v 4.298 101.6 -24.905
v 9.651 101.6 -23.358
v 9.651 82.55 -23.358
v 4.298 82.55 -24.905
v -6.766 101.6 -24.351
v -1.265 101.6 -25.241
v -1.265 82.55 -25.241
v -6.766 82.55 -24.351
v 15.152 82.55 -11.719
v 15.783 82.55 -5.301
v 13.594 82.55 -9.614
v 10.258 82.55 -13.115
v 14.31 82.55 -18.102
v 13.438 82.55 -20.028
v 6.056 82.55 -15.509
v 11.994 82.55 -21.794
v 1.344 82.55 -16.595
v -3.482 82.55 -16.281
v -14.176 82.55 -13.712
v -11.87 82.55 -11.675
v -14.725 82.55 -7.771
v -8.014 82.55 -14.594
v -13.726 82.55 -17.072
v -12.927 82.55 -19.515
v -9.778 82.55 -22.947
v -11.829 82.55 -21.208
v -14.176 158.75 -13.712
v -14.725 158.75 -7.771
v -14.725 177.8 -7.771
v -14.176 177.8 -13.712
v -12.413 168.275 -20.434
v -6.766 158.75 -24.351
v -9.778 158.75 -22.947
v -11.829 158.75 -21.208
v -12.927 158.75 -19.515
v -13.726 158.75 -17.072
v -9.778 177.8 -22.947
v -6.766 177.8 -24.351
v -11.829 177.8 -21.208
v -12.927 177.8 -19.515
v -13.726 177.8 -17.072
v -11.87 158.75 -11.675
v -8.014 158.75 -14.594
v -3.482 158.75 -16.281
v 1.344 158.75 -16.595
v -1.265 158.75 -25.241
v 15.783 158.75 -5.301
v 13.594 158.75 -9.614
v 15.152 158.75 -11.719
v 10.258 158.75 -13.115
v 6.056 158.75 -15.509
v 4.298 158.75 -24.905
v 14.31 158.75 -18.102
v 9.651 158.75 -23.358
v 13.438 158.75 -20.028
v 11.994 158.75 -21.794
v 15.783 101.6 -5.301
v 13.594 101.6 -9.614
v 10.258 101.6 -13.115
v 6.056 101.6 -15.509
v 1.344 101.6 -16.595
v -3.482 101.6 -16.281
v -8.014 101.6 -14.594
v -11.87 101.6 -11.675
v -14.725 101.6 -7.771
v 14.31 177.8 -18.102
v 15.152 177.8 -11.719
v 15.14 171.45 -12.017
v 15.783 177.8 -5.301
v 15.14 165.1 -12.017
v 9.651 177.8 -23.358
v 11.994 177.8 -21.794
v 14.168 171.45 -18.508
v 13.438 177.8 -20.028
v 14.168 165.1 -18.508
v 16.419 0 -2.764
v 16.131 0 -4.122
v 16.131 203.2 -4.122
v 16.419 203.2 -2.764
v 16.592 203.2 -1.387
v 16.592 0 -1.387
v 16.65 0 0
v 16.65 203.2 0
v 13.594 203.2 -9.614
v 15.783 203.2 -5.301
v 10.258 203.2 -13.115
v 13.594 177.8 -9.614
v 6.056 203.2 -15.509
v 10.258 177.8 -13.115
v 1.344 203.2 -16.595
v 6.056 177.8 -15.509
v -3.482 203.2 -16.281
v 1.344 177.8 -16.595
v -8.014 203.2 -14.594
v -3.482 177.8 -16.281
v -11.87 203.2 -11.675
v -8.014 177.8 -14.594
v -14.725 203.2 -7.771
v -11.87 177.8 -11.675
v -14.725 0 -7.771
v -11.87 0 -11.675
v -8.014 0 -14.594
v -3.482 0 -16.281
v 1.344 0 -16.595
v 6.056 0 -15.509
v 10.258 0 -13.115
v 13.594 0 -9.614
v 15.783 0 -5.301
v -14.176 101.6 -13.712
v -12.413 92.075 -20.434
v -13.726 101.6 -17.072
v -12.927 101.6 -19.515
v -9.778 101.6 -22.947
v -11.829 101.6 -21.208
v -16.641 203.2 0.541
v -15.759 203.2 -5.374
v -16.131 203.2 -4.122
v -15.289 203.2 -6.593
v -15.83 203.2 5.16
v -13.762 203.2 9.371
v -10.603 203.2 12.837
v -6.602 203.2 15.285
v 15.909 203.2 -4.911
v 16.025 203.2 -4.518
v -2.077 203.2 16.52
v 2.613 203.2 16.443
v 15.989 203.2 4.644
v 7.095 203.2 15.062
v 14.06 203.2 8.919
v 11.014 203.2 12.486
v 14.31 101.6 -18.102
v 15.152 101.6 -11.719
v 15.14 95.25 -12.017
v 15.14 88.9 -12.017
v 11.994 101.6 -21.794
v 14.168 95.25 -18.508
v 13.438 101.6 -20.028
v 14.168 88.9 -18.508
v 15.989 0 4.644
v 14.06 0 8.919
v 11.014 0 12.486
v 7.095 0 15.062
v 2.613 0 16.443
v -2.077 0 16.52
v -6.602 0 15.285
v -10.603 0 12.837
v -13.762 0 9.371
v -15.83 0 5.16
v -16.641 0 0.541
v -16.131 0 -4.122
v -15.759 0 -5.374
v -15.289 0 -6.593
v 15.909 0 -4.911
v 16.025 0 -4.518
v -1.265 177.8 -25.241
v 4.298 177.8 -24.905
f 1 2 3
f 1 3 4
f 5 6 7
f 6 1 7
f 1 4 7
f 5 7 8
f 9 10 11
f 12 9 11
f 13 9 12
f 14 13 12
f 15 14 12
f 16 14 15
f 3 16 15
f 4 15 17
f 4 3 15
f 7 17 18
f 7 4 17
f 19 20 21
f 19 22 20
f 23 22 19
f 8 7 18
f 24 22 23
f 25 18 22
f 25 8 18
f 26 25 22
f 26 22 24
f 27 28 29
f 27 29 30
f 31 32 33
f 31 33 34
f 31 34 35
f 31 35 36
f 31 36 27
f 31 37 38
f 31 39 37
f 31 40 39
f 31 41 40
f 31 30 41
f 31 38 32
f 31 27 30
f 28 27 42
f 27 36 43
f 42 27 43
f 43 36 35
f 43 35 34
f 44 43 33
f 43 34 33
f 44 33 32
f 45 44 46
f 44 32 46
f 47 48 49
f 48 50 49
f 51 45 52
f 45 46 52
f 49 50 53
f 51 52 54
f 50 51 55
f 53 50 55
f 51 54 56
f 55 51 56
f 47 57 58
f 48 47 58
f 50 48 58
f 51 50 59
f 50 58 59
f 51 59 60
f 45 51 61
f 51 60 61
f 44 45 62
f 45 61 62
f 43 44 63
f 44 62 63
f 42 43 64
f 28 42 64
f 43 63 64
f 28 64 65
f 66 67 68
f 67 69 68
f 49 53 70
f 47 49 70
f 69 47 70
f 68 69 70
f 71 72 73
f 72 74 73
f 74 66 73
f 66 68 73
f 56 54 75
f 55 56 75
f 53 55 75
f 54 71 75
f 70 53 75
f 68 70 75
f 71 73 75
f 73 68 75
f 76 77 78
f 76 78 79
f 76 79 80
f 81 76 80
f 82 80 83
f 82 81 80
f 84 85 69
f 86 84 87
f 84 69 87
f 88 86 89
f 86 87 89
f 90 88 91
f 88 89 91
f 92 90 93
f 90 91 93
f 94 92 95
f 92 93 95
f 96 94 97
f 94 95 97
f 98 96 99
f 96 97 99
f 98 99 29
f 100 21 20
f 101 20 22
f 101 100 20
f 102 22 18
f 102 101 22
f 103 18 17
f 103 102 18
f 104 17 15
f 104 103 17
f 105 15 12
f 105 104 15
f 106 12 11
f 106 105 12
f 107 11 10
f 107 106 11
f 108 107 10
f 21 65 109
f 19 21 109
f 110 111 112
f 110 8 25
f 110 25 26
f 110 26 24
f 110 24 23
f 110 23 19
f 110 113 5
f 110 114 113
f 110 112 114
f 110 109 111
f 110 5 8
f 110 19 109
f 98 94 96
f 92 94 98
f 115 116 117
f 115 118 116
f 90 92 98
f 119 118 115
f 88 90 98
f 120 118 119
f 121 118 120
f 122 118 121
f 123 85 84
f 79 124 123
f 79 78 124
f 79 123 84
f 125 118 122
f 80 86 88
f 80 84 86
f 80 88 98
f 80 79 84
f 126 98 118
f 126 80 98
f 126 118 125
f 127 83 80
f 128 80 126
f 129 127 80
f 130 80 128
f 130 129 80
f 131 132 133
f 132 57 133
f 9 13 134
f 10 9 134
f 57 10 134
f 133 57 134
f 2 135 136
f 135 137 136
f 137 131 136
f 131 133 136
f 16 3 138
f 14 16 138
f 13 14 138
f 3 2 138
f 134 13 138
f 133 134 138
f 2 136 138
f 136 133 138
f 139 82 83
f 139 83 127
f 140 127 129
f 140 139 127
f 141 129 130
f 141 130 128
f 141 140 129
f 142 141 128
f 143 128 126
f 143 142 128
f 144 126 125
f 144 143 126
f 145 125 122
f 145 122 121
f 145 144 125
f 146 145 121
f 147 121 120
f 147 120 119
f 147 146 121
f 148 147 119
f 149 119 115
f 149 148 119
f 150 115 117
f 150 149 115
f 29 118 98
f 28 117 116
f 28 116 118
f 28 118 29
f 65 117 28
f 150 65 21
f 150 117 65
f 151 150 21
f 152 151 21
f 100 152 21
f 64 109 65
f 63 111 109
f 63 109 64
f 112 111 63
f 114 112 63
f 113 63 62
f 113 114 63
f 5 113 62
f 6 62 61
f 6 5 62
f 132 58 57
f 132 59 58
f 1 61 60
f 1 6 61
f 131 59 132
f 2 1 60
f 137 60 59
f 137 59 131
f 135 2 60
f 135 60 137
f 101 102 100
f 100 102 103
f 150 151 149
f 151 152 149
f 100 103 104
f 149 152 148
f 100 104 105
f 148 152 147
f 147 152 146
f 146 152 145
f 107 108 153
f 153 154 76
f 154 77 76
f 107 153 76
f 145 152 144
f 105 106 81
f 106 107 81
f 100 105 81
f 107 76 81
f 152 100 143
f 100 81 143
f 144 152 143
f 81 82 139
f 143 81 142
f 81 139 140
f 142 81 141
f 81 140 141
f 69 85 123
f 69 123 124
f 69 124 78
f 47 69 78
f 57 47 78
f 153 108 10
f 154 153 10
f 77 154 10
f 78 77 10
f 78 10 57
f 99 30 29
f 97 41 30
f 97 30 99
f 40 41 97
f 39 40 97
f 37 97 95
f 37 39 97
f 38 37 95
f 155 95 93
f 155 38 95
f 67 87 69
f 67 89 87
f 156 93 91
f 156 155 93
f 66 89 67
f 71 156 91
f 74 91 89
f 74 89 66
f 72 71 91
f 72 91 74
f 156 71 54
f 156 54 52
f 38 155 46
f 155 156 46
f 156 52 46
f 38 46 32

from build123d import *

# Parameters (mm, degrees)
SKETCH1_R           = 25.273
BOSS_EXTRUDE1_DEPTH = 203.2
CUT_EXTRUDE1_START  = -203.2
CUT_EXTRUDE1_DEPTH  = 203.2
SKETCH3_OUTSIDE_W   = 77.326
SKETCH3_OUTSIDE_H   = 85.949
SKETCH3_OUTSIDE_R   = 16.6497
CUT_EXTRUDE5_DEPTH  = 50.8
SKETCH4_OUTSIDE_W   = 77.326
SKETCH4_OUTSIDE_H   = 85.949
SKETCH4_OUTSIDE_R   = 16.6497
CUT_EXTRUDE6_DEPTH  = 57.15
SKETCH5_OUTSIDE_W   = 77.326
SKETCH5_OUTSIDE_H   = 85.949
SKETCH5_OUTSIDE_R   = 16.6497
CUT_EXTRUDE7_DEPTH  = 82.55


with BuildPart() as part:
    # Sketch1 → Boss-Extrude1 (new body)
    with BuildSketch(Plane(origin=(0, 0, 0), x_dir=(1, 0, 0), z_dir=(0, 1, 0))):
        with Locations(Location((0, 0, 0), (0, 0, 270))):
            Circle(SKETCH1_R)
    extrude(amount=BOSS_EXTRUDE1_DEPTH)

    # Sketch2 → Cut-Extrude1 (cut)
    with BuildSketch(Plane(origin=(0, 203.2, 0), x_dir=(1, 0, 0), z_dir=(0, 1, 0)).offset(CUT_EXTRUDE1_START)):
        with BuildLine():
            ThreePointArc((16.131428812, 4.121833886), (16.519624093, 2.077144651), (16.6497, 0))
            ThreePointArc((16.6497, 0), (-2.077144651, -16.519624093), (-16.131428812, 4.121833886))
            ThreePointArc((-16.131428812, 4.121833886), (-15.535644224, 5.988010406), (-14.724792916, 7.771292277))
            add(Edge.make_bspline(
                [(-14.724792916, 7.771292277), (-13.993112244, 11.833627294), (-14.951269099, 19.976611229), (-9.134694512, 23.553200783), (-6.765592548, 24.350591091)],
                knots=[0.117816193, 0.117816193, 0.117816193, 0.117816193, 0.459844437, 0.648405496, 0.648405496, 0.648405496, 0.648405496], degree=3))
            ThreePointArc((-6.765592548, 24.350591091), (-15.292771308, -20.121025688), (25.273, 0))
            ThreePointArc((25.273, 0), (21.007635157, 14.050046053), (9.651285593, 23.357594384))
            add(Edge.make_bspline(
                [(15.783143796, 5.301403776), (14.234187932, 11.657324188), (17.010518971, 19.800729125), (9.651285593, 23.357594384)],
                knots=[0.052591674, 0.052591674, 0.052591674, 0.052591674, 0.886528555, 0.886528555, 0.886528555, 0.886528555], degree=3))
            ThreePointArc((15.783143796, 5.301403776), (15.968181877, 4.714835907), (16.131428812, 4.121833886))
        make_face()
    extrude(amount=CUT_EXTRUDE1_DEPTH, mode=Mode.SUBTRACT)

    # Sketch3 outside → Cut-Extrude5 (cut)
    with BuildSketch(Plane(origin=(0, 177.8, 0), x_dir=(1, 0, 0), z_dir=(0, 1, 0))):
        with Locations((0, 4.3115)):
            Rectangle(SKETCH3_OUTSIDE_W, SKETCH3_OUTSIDE_H)
        with Locations(Location((0, 0, 0), (0, 0, 270))):
            Circle(SKETCH3_OUTSIDE_R, mode=Mode.SUBTRACT)
    extrude(amount=CUT_EXTRUDE5_DEPTH, mode=Mode.SUBTRACT)

    # Sketch4 outside → Cut-Extrude6 (cut)
    with BuildSketch(Plane(origin=(0, 101.6, 0), x_dir=(1, 0, 0), z_dir=(0, 1, 0))):
        with Locations((0, 4.3115)):
            Rectangle(SKETCH4_OUTSIDE_W, SKETCH4_OUTSIDE_H)
        with Locations(Location((0, 0, 0), (0, 0, 270))):
            Circle(SKETCH4_OUTSIDE_R, mode=Mode.SUBTRACT)
    extrude(amount=CUT_EXTRUDE6_DEPTH, mode=Mode.SUBTRACT)

    # Sketch5 outside → Cut-Extrude7 (cut)
    with BuildSketch(Plane(origin=(0, 0, 0), x_dir=(-1, 0, 0), z_dir=(0, -1, 0))):
        with Locations((0, 4.3115)):
            Rectangle(SKETCH5_OUTSIDE_W, SKETCH5_OUTSIDE_H)
        with Locations(Location((0, 0, 0), (0, 0, 270))):
            Circle(SKETCH5_OUTSIDE_R, mode=Mode.SUBTRACT)
    extrude(amount=-CUT_EXTRUDE7_DEPTH, mode=Mode.SUBTRACT)


solid = part.part
